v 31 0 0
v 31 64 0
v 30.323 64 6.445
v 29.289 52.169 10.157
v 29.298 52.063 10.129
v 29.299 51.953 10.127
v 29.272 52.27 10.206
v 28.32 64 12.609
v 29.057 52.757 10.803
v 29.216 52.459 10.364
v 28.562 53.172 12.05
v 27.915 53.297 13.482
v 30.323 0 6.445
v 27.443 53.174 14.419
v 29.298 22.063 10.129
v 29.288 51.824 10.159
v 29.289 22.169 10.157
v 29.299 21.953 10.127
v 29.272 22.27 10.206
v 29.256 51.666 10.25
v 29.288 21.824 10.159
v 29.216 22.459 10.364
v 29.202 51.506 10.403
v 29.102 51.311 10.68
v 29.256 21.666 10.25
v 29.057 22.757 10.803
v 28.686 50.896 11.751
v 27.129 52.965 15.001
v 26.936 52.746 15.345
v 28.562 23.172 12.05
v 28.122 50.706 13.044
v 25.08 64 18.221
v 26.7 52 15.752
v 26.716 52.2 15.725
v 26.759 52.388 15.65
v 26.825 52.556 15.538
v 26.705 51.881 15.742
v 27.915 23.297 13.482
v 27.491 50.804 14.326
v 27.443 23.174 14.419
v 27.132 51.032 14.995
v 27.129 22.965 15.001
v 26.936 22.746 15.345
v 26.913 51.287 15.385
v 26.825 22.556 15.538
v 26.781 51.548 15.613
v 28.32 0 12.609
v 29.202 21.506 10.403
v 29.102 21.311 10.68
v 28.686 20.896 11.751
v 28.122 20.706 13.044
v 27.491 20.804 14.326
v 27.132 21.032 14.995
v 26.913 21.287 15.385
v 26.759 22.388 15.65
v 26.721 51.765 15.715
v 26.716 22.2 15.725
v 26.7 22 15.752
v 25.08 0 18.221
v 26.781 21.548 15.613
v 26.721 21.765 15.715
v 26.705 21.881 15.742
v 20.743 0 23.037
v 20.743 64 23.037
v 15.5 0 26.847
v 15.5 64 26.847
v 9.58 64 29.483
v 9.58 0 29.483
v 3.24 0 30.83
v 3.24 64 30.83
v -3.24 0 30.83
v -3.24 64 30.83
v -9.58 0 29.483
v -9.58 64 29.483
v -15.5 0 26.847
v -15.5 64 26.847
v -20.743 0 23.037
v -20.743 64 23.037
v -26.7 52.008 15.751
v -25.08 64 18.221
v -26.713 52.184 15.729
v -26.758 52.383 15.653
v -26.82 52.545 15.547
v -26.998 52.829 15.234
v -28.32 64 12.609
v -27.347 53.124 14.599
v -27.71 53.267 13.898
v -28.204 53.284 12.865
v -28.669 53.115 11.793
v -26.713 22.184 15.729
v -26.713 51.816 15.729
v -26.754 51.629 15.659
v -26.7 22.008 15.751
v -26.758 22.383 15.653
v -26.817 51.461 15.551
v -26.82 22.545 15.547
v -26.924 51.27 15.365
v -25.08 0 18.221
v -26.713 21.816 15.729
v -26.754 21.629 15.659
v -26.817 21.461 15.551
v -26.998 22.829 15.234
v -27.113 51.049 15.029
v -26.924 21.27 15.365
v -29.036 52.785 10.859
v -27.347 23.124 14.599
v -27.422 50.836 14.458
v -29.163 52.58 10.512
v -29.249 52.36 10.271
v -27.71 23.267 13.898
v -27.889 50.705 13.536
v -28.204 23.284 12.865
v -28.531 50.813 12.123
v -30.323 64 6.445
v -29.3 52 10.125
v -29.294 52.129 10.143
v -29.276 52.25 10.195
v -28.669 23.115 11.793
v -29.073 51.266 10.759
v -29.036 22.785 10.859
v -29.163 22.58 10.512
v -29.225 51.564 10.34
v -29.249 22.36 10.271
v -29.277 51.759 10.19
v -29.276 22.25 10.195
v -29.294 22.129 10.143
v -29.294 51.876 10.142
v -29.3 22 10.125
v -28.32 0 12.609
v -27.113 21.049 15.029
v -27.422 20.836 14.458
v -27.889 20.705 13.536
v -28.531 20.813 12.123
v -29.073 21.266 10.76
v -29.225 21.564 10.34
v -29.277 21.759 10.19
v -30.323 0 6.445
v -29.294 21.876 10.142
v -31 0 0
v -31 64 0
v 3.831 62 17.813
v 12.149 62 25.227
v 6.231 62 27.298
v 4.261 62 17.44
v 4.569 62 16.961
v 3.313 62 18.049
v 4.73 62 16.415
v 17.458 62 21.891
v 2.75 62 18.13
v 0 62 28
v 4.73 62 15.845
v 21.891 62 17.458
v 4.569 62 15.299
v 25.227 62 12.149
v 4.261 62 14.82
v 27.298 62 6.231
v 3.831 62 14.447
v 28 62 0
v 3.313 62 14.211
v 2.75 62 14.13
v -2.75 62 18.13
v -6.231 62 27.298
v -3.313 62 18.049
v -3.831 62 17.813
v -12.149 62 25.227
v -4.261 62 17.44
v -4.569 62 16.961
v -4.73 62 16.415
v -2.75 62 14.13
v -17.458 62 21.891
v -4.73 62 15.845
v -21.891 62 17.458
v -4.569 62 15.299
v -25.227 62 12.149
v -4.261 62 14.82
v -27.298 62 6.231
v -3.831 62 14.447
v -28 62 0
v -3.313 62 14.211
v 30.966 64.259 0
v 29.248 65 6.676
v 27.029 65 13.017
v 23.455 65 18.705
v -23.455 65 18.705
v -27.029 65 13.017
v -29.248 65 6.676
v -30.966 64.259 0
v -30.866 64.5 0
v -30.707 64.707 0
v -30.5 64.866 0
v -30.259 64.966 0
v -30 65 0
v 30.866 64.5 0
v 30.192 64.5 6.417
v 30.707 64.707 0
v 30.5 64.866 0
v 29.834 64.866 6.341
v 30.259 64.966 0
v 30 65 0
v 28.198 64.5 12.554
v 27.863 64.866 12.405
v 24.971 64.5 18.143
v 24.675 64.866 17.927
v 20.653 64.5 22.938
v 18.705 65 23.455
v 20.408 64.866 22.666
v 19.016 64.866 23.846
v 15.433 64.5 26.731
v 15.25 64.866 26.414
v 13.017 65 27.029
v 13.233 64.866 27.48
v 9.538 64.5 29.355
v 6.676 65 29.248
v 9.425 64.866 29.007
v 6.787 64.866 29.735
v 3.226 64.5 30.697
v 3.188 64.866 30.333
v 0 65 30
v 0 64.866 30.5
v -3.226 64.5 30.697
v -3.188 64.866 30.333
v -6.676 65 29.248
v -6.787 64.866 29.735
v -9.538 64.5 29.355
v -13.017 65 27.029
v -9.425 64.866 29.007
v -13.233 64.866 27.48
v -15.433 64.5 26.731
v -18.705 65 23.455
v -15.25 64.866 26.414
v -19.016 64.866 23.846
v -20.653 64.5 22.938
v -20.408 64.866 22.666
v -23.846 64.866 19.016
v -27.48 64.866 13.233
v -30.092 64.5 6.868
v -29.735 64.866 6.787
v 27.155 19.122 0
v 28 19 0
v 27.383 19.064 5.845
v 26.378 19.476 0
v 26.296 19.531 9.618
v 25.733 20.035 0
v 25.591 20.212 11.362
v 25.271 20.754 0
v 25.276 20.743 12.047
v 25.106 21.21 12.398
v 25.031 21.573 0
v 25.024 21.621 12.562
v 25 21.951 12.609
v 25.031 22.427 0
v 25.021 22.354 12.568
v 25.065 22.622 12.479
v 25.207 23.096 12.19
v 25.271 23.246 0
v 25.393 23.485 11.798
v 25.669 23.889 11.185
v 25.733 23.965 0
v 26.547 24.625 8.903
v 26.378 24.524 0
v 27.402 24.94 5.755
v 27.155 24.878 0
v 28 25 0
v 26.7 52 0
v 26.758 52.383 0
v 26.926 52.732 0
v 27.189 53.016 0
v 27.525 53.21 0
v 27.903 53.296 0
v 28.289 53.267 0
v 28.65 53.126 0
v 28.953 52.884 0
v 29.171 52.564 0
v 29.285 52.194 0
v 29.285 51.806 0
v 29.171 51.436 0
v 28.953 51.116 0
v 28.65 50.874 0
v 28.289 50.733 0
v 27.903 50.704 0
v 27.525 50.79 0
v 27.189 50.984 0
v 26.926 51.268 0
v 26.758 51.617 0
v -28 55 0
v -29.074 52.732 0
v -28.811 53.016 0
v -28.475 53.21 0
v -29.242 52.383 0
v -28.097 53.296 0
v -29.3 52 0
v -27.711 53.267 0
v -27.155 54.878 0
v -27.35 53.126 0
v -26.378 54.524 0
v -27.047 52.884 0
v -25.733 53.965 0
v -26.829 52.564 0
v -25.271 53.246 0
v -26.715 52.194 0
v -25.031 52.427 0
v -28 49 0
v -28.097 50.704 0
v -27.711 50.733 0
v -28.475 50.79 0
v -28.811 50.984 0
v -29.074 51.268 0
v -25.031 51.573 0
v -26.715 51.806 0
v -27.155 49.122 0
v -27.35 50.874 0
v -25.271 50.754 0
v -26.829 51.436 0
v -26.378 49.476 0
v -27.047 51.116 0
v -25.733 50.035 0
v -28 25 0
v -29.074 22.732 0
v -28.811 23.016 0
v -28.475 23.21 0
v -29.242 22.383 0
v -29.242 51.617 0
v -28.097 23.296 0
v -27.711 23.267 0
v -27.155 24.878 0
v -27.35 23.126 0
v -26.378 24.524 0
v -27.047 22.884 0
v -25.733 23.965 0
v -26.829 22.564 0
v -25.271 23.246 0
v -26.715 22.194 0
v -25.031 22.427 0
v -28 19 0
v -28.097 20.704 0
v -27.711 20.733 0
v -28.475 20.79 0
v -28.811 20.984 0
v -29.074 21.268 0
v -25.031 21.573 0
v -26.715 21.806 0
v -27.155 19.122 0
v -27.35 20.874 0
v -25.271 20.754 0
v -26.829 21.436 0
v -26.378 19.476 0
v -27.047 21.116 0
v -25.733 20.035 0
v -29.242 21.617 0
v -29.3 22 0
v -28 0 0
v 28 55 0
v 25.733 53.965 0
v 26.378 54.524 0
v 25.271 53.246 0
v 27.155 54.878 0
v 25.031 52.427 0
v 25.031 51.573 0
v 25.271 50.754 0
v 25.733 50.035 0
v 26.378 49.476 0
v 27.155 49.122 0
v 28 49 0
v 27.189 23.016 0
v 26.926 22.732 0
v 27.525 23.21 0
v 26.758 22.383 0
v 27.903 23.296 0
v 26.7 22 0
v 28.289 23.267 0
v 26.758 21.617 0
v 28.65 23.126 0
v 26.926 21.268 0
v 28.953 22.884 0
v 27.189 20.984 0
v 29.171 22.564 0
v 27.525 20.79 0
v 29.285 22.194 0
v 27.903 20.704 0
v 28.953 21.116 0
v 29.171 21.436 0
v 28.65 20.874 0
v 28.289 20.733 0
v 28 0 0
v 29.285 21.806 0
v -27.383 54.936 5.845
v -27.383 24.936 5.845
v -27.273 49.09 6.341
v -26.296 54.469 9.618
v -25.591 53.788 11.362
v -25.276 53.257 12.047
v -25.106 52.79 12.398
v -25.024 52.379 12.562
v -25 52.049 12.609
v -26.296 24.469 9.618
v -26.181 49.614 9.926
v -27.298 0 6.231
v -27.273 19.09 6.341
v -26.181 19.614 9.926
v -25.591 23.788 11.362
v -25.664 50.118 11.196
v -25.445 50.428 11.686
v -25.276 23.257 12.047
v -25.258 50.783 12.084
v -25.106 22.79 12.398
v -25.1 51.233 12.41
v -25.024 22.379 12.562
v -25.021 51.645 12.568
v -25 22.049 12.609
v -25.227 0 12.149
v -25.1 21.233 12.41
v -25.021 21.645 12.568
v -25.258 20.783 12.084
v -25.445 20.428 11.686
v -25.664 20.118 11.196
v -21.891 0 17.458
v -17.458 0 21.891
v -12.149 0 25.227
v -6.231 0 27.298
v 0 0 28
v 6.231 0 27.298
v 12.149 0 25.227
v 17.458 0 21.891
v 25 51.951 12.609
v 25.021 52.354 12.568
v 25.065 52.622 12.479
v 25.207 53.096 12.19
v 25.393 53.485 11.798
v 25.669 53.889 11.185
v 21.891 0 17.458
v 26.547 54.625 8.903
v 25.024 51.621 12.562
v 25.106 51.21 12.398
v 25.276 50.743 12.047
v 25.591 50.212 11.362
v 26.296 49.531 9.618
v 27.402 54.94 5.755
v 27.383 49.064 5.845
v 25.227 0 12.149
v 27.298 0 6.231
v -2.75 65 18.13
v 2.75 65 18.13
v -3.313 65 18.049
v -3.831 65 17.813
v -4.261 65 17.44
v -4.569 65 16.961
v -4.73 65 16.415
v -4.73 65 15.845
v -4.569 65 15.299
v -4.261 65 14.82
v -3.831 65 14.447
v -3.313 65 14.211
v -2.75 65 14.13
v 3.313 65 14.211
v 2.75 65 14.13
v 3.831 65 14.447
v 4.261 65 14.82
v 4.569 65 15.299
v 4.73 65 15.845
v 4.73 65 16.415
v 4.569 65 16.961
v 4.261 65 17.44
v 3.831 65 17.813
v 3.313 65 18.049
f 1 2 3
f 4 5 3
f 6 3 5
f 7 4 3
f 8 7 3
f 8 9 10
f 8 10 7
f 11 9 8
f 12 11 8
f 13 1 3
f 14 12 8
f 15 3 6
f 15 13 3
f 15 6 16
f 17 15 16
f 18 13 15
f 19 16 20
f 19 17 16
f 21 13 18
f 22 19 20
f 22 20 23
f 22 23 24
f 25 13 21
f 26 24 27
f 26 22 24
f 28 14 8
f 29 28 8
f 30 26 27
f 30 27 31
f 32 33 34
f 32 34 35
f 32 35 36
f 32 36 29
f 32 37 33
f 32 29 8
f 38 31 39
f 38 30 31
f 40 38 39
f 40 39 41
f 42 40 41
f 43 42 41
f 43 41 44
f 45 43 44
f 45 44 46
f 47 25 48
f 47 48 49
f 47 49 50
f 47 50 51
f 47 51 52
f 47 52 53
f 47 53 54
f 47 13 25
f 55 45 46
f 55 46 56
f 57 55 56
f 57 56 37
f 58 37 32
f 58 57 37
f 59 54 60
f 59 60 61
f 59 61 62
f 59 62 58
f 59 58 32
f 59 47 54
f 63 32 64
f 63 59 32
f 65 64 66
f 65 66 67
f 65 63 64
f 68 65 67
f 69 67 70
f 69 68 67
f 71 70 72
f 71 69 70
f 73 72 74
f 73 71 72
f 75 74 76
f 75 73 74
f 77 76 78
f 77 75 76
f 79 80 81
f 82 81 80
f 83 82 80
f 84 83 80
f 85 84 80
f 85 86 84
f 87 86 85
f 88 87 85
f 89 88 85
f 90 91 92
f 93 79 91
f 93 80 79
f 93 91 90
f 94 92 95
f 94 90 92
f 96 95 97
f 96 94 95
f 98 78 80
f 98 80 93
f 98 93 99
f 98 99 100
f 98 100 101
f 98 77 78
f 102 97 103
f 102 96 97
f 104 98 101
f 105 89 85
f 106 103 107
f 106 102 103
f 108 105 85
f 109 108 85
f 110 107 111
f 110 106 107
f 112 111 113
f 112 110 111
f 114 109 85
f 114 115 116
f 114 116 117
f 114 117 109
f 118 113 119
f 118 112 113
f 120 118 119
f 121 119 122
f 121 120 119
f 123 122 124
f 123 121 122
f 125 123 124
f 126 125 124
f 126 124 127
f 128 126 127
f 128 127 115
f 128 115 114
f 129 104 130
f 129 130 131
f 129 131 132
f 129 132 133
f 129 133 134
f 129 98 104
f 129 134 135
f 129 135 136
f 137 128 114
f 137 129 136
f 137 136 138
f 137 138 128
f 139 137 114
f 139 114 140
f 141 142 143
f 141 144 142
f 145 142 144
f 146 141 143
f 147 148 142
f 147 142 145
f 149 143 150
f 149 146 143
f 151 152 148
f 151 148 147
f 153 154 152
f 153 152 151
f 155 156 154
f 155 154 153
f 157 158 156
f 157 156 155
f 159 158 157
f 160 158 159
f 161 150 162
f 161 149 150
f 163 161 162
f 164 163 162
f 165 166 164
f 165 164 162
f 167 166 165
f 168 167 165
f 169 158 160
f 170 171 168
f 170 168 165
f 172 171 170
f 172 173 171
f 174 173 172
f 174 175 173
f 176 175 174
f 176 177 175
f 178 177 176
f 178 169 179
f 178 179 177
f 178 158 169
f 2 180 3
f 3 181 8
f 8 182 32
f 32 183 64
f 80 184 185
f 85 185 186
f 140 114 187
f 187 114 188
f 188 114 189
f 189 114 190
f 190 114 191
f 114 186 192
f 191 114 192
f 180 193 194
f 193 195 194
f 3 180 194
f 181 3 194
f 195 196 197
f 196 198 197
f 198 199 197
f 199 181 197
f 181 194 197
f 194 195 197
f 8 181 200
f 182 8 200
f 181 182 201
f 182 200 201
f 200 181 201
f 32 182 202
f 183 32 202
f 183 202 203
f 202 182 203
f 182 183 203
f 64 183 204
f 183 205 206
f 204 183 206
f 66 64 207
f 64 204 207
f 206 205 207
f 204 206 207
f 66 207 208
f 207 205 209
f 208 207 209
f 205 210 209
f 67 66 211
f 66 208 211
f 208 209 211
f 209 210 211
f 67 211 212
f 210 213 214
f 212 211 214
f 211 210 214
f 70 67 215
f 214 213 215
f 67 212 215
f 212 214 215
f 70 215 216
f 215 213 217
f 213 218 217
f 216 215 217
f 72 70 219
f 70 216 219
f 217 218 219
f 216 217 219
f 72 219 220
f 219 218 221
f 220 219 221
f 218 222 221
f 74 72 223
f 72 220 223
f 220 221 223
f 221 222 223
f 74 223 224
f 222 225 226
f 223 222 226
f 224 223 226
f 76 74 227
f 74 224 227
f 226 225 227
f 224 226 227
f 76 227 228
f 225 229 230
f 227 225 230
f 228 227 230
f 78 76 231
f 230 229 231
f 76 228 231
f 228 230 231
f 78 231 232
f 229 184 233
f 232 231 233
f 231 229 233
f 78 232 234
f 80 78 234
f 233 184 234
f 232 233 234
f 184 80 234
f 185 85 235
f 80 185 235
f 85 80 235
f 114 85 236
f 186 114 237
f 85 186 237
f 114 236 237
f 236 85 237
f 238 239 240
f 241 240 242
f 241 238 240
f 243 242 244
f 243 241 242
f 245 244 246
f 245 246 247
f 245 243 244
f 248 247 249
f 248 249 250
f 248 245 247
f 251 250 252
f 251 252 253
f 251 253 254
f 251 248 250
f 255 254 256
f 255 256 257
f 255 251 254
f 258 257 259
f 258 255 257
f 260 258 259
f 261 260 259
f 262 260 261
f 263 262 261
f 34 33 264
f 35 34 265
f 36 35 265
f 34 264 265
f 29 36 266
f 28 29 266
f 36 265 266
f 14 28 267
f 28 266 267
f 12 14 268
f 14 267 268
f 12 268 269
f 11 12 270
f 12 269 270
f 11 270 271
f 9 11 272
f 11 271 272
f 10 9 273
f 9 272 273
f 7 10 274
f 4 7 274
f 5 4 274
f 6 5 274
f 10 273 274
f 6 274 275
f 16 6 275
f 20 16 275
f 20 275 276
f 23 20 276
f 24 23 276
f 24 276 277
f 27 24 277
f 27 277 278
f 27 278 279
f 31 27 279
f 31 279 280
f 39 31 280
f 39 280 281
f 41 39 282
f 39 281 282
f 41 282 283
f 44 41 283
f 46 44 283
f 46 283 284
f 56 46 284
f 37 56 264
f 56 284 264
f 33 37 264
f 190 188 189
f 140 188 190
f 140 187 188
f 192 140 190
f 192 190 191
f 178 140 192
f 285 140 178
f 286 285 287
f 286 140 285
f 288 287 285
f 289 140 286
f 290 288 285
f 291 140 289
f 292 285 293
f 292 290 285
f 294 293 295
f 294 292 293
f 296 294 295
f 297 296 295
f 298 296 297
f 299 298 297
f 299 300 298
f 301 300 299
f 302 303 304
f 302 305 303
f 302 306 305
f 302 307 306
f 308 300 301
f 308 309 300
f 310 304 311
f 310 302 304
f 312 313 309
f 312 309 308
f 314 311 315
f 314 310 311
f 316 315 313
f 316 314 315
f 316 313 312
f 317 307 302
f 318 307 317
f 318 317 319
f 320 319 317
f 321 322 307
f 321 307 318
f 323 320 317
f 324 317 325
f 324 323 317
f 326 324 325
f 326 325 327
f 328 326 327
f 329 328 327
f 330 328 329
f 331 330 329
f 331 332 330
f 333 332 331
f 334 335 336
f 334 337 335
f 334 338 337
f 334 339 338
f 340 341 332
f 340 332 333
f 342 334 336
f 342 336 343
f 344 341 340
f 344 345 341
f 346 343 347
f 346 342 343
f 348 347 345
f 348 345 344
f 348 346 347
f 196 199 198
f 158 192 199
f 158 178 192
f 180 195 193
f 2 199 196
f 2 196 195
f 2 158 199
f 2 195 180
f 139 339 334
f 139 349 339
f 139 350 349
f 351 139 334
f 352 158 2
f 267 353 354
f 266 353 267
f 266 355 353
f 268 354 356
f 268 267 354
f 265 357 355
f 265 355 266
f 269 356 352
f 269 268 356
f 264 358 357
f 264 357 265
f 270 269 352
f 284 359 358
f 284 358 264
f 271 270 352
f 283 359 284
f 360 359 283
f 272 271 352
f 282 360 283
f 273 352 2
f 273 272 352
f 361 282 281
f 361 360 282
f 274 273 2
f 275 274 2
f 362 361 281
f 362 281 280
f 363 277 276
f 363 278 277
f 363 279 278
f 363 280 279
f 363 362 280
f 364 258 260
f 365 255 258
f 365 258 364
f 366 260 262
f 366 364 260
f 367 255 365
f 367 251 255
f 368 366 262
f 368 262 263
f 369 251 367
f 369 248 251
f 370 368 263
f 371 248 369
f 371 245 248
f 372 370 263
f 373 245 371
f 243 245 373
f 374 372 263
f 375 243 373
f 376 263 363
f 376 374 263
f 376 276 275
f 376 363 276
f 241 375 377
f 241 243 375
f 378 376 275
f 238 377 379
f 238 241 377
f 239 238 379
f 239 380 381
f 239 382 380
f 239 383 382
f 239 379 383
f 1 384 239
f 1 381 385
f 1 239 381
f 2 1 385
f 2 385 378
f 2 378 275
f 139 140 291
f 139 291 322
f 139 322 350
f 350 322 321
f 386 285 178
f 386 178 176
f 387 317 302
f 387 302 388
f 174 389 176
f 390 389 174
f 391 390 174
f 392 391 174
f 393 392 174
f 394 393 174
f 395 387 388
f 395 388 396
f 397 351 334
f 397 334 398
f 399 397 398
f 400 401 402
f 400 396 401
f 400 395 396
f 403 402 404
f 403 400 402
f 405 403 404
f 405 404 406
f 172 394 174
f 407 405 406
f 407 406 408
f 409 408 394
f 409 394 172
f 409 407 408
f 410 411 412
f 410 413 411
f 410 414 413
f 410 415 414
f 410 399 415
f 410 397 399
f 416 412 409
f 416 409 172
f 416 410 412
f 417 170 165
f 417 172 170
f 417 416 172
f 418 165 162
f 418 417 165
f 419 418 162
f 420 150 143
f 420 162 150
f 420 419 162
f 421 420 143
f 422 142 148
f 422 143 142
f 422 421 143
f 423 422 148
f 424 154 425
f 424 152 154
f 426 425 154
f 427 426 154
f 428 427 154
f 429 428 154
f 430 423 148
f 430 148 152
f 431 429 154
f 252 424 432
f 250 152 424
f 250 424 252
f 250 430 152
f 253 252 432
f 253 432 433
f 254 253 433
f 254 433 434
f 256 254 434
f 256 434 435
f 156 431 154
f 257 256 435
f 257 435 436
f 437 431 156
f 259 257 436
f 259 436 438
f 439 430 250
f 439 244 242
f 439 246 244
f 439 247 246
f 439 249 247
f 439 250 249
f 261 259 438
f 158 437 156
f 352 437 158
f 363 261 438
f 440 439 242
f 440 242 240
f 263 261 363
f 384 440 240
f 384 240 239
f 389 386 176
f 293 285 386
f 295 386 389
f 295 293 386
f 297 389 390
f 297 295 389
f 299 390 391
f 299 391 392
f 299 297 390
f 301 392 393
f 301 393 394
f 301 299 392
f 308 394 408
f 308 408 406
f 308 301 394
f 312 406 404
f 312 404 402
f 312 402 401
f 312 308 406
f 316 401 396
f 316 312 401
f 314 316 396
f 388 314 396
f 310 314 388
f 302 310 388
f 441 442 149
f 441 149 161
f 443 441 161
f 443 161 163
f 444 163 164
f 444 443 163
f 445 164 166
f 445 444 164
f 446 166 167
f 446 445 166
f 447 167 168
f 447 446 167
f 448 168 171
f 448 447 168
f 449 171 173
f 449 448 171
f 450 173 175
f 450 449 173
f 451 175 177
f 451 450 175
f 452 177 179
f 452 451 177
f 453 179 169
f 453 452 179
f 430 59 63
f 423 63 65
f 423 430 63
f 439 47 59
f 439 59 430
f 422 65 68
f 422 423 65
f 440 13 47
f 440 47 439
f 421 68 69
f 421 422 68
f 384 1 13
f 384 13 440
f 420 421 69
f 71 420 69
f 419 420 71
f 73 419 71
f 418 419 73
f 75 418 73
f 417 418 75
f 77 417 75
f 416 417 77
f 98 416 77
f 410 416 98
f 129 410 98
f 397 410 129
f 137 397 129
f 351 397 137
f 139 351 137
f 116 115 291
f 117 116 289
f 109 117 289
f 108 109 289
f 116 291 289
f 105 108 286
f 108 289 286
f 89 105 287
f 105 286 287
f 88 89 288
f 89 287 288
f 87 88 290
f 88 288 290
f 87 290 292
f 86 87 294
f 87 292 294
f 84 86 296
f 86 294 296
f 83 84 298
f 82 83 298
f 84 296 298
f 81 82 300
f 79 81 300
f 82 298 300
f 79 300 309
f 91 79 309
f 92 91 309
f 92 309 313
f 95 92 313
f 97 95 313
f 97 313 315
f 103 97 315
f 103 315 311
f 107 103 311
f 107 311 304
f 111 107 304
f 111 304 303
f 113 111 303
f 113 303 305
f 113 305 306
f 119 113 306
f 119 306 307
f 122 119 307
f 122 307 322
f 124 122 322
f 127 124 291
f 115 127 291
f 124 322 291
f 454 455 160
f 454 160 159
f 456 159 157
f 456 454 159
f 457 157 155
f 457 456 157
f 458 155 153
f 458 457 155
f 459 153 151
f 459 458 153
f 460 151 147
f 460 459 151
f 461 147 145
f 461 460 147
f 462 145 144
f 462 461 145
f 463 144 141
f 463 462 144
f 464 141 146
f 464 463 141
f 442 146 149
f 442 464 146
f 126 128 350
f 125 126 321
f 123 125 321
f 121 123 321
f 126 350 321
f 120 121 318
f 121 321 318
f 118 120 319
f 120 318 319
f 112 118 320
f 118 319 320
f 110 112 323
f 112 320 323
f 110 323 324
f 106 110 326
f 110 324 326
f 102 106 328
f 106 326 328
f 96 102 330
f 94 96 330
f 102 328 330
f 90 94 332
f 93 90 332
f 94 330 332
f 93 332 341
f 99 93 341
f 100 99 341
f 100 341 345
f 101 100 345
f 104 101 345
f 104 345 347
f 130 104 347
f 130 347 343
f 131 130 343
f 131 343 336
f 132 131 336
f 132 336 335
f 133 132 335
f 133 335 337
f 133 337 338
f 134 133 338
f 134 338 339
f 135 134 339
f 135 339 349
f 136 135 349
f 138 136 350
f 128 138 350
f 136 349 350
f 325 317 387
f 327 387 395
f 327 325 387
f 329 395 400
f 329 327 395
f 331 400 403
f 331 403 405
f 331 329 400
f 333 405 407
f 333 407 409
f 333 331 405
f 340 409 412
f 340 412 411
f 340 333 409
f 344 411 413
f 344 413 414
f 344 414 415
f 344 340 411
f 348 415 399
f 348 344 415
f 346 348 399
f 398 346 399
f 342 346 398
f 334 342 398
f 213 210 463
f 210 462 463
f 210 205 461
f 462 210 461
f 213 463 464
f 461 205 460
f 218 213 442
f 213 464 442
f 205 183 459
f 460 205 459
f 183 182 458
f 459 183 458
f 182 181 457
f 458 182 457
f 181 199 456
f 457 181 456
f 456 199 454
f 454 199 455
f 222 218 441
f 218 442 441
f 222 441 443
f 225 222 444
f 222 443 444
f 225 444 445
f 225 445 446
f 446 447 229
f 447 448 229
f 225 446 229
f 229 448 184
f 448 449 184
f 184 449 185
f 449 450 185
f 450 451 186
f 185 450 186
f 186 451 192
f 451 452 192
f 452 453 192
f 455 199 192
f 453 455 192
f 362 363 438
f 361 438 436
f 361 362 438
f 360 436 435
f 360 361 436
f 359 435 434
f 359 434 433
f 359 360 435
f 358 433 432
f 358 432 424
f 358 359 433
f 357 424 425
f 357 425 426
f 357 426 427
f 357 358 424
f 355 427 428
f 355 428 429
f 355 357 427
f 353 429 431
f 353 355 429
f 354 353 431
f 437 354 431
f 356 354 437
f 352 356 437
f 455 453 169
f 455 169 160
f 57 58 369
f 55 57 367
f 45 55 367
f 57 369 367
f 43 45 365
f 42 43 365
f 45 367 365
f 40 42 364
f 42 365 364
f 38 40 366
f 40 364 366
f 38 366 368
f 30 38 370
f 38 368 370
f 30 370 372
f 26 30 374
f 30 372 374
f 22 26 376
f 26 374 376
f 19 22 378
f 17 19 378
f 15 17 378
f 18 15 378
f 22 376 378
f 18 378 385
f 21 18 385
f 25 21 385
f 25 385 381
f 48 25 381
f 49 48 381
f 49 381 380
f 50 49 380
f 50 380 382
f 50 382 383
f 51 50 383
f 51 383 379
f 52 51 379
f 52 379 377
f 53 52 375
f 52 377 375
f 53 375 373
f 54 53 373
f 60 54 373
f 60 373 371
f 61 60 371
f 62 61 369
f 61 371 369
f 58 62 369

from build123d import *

# Parameters (mm, degrees)
EXTRUDE_1_DEPTH     = 65
EXTRUDE_5_REACH     = 80.403
SKETCH_12_R         = 3
SKETCH_16_R         = 1.3
CUT_EXTRUDE_2_DEPTH = 79.402806155
EXTRUDE_START       = -3
EXTRUDE_6_DEPTH     = 3
FILLET_1_R          = 1
CUT_EXTRUDE_3_REACH = 80.403


with BuildPart() as part:
    # Эскиз1 → Бобышка-Вытянуть1 (new body)
    with BuildSketch(Plane(origin=(0, 0, 0), x_dir=(1, 0, 0), z_dir=(0, 1, 0))):
        with BuildLine():
            Line((-31, 0), (-28, 0))
            ThreePointArc((-28, 0), (0, -28), (28, 0))
            Line((28, 0), (31, 0))
            ThreePointArc((31, 0), (0, -31), (-31, 0))
        make_face()
    extrude(amount=EXTRUDE_1_DEPTH)

    # Эскиз12 → Бобышка-Вытянуть5 (add, up to next)
    with BuildSketch(Plane(origin=(0, 0, 0), x_dir=(-1, 0, 0), z_dir=(0, 0, -1)), mode=Mode.PRIVATE) as extrude_5_sk1:
        with Locations((28, 52)):
            Circle(SKETCH_12_R)
    extrude_5_tool1 = extrude(extrude_5_sk1.sketch, amount=-EXTRUDE_5_REACH, mode=Mode.PRIVATE) - part.part
    # Эскиз12 → Бобышка-Вытянуть5 (add, up to next)
    with BuildSketch(Plane(origin=(0, 0, 0), x_dir=(-1, 0, 0), z_dir=(0, 0, -1)), mode=Mode.PRIVATE) as extrude_5_sk2:
        with Locations((28, 22)):
            Circle(SKETCH_12_R)
    extrude_5_tool2 = extrude(extrude_5_sk2.sketch, amount=-EXTRUDE_5_REACH, mode=Mode.PRIVATE) - part.part
    # Эскиз12 → Бобышка-Вытянуть5 (add, up to next)
    with BuildSketch(Plane(origin=(0, 0, 0), x_dir=(-1, 0, 0), z_dir=(0, 0, -1)), mode=Mode.PRIVATE) as extrude_5_sk3:
        with Locations((-28, 52)):
            Circle(SKETCH_12_R)
    extrude_5_tool3 = extrude(extrude_5_sk3.sketch, amount=-EXTRUDE_5_REACH, mode=Mode.PRIVATE) - part.part
    # Эскиз12 → Бобышка-Вытянуть5 (add, up to next)
    with BuildSketch(Plane(origin=(0, 0, 0), x_dir=(-1, 0, 0), z_dir=(0, 0, -1)), mode=Mode.PRIVATE) as extrude_5_sk4:
        with Locations((-28, 22)):
            Circle(SKETCH_12_R)
    extrude_5_tool4 = extrude(extrude_5_sk4.sketch, amount=-EXTRUDE_5_REACH, mode=Mode.PRIVATE) - part.part
    add(extrude_5_tool1.solids().sort_by_distance((-28, 52, 0))[0])
    add(extrude_5_tool2.solids().sort_by_distance((-28, 22, 0))[0])
    add(extrude_5_tool3.solids().sort_by_distance((28, 52, 0))[0])
    add(extrude_5_tool4.solids().sort_by_distance((28, 22, 0))[0])

    # Эскиз16 → Вырез-Вытянуть2 (cut, through all)
    with BuildSketch(Plane(origin=(0, 0, 0), x_dir=(-1, 0, 0), z_dir=(0, 0, -1))):
        with Locations((28, 52)):
            Circle(SKETCH_16_R)
        with Locations((28, 22)):
            Circle(SKETCH_16_R)
        with Locations((-28, 22)):
            Circle(SKETCH_16_R)
        with Locations((-28, 52)):
            Circle(SKETCH_16_R)
    extrude(amount=-CUT_EXTRUDE_2_DEPTH, mode=Mode.SUBTRACT)

    # Эскиз2 → Бобышка-Вытянуть6 (add)
    with BuildSketch(Plane(origin=(0, 65, 0), x_dir=(1, 0, 0), z_dir=(0, 1, 0)).offset(EXTRUDE_START)):
        with BuildLine():
            Line((-31, 0), (31, 0))
            ThreePointArc((31, 0), (0, -31), (-31, 0))
        make_face()
    extrude(amount=EXTRUDE_6_DEPTH)

    # Скругление1
    fillet_1_edges = [part.edges().sort_by_distance(p)[0] for p in [
        (0, 65, 31),
    ]]
    fillet(fillet_1_edges, radius=FILLET_1_R)

    # Эскиз18 → Вырез-Вытянуть3 (cut, up to next)
    with BuildSketch(Plane(origin=(0, 65, 0), x_dir=(1, 0, 0), z_dir=(0, 1, 0)), mode=Mode.PRIVATE) as cut_extrude_3_sk1:
        with BuildLine():
            Line((-2.75, -14.13), (2.75, -14.13))
            ThreePointArc((2.75, -14.13), (4.75, -16.13), (2.75, -18.13))
            Line((2.75, -18.13), (-2.75, -18.13))
            ThreePointArc((-2.75, -18.13), (-4.75, -16.13), (-2.75, -14.13))
        make_face()
    cut_extrude_3_tool1 = extrude(cut_extrude_3_sk1.sketch, amount=-CUT_EXTRUDE_3_REACH, mode=Mode.PRIVATE) & part.part
    add(cut_extrude_3_tool1.solids().sort_by_distance((0, 65, 16.13))[0], mode=Mode.SUBTRACT)


solid = part.part
